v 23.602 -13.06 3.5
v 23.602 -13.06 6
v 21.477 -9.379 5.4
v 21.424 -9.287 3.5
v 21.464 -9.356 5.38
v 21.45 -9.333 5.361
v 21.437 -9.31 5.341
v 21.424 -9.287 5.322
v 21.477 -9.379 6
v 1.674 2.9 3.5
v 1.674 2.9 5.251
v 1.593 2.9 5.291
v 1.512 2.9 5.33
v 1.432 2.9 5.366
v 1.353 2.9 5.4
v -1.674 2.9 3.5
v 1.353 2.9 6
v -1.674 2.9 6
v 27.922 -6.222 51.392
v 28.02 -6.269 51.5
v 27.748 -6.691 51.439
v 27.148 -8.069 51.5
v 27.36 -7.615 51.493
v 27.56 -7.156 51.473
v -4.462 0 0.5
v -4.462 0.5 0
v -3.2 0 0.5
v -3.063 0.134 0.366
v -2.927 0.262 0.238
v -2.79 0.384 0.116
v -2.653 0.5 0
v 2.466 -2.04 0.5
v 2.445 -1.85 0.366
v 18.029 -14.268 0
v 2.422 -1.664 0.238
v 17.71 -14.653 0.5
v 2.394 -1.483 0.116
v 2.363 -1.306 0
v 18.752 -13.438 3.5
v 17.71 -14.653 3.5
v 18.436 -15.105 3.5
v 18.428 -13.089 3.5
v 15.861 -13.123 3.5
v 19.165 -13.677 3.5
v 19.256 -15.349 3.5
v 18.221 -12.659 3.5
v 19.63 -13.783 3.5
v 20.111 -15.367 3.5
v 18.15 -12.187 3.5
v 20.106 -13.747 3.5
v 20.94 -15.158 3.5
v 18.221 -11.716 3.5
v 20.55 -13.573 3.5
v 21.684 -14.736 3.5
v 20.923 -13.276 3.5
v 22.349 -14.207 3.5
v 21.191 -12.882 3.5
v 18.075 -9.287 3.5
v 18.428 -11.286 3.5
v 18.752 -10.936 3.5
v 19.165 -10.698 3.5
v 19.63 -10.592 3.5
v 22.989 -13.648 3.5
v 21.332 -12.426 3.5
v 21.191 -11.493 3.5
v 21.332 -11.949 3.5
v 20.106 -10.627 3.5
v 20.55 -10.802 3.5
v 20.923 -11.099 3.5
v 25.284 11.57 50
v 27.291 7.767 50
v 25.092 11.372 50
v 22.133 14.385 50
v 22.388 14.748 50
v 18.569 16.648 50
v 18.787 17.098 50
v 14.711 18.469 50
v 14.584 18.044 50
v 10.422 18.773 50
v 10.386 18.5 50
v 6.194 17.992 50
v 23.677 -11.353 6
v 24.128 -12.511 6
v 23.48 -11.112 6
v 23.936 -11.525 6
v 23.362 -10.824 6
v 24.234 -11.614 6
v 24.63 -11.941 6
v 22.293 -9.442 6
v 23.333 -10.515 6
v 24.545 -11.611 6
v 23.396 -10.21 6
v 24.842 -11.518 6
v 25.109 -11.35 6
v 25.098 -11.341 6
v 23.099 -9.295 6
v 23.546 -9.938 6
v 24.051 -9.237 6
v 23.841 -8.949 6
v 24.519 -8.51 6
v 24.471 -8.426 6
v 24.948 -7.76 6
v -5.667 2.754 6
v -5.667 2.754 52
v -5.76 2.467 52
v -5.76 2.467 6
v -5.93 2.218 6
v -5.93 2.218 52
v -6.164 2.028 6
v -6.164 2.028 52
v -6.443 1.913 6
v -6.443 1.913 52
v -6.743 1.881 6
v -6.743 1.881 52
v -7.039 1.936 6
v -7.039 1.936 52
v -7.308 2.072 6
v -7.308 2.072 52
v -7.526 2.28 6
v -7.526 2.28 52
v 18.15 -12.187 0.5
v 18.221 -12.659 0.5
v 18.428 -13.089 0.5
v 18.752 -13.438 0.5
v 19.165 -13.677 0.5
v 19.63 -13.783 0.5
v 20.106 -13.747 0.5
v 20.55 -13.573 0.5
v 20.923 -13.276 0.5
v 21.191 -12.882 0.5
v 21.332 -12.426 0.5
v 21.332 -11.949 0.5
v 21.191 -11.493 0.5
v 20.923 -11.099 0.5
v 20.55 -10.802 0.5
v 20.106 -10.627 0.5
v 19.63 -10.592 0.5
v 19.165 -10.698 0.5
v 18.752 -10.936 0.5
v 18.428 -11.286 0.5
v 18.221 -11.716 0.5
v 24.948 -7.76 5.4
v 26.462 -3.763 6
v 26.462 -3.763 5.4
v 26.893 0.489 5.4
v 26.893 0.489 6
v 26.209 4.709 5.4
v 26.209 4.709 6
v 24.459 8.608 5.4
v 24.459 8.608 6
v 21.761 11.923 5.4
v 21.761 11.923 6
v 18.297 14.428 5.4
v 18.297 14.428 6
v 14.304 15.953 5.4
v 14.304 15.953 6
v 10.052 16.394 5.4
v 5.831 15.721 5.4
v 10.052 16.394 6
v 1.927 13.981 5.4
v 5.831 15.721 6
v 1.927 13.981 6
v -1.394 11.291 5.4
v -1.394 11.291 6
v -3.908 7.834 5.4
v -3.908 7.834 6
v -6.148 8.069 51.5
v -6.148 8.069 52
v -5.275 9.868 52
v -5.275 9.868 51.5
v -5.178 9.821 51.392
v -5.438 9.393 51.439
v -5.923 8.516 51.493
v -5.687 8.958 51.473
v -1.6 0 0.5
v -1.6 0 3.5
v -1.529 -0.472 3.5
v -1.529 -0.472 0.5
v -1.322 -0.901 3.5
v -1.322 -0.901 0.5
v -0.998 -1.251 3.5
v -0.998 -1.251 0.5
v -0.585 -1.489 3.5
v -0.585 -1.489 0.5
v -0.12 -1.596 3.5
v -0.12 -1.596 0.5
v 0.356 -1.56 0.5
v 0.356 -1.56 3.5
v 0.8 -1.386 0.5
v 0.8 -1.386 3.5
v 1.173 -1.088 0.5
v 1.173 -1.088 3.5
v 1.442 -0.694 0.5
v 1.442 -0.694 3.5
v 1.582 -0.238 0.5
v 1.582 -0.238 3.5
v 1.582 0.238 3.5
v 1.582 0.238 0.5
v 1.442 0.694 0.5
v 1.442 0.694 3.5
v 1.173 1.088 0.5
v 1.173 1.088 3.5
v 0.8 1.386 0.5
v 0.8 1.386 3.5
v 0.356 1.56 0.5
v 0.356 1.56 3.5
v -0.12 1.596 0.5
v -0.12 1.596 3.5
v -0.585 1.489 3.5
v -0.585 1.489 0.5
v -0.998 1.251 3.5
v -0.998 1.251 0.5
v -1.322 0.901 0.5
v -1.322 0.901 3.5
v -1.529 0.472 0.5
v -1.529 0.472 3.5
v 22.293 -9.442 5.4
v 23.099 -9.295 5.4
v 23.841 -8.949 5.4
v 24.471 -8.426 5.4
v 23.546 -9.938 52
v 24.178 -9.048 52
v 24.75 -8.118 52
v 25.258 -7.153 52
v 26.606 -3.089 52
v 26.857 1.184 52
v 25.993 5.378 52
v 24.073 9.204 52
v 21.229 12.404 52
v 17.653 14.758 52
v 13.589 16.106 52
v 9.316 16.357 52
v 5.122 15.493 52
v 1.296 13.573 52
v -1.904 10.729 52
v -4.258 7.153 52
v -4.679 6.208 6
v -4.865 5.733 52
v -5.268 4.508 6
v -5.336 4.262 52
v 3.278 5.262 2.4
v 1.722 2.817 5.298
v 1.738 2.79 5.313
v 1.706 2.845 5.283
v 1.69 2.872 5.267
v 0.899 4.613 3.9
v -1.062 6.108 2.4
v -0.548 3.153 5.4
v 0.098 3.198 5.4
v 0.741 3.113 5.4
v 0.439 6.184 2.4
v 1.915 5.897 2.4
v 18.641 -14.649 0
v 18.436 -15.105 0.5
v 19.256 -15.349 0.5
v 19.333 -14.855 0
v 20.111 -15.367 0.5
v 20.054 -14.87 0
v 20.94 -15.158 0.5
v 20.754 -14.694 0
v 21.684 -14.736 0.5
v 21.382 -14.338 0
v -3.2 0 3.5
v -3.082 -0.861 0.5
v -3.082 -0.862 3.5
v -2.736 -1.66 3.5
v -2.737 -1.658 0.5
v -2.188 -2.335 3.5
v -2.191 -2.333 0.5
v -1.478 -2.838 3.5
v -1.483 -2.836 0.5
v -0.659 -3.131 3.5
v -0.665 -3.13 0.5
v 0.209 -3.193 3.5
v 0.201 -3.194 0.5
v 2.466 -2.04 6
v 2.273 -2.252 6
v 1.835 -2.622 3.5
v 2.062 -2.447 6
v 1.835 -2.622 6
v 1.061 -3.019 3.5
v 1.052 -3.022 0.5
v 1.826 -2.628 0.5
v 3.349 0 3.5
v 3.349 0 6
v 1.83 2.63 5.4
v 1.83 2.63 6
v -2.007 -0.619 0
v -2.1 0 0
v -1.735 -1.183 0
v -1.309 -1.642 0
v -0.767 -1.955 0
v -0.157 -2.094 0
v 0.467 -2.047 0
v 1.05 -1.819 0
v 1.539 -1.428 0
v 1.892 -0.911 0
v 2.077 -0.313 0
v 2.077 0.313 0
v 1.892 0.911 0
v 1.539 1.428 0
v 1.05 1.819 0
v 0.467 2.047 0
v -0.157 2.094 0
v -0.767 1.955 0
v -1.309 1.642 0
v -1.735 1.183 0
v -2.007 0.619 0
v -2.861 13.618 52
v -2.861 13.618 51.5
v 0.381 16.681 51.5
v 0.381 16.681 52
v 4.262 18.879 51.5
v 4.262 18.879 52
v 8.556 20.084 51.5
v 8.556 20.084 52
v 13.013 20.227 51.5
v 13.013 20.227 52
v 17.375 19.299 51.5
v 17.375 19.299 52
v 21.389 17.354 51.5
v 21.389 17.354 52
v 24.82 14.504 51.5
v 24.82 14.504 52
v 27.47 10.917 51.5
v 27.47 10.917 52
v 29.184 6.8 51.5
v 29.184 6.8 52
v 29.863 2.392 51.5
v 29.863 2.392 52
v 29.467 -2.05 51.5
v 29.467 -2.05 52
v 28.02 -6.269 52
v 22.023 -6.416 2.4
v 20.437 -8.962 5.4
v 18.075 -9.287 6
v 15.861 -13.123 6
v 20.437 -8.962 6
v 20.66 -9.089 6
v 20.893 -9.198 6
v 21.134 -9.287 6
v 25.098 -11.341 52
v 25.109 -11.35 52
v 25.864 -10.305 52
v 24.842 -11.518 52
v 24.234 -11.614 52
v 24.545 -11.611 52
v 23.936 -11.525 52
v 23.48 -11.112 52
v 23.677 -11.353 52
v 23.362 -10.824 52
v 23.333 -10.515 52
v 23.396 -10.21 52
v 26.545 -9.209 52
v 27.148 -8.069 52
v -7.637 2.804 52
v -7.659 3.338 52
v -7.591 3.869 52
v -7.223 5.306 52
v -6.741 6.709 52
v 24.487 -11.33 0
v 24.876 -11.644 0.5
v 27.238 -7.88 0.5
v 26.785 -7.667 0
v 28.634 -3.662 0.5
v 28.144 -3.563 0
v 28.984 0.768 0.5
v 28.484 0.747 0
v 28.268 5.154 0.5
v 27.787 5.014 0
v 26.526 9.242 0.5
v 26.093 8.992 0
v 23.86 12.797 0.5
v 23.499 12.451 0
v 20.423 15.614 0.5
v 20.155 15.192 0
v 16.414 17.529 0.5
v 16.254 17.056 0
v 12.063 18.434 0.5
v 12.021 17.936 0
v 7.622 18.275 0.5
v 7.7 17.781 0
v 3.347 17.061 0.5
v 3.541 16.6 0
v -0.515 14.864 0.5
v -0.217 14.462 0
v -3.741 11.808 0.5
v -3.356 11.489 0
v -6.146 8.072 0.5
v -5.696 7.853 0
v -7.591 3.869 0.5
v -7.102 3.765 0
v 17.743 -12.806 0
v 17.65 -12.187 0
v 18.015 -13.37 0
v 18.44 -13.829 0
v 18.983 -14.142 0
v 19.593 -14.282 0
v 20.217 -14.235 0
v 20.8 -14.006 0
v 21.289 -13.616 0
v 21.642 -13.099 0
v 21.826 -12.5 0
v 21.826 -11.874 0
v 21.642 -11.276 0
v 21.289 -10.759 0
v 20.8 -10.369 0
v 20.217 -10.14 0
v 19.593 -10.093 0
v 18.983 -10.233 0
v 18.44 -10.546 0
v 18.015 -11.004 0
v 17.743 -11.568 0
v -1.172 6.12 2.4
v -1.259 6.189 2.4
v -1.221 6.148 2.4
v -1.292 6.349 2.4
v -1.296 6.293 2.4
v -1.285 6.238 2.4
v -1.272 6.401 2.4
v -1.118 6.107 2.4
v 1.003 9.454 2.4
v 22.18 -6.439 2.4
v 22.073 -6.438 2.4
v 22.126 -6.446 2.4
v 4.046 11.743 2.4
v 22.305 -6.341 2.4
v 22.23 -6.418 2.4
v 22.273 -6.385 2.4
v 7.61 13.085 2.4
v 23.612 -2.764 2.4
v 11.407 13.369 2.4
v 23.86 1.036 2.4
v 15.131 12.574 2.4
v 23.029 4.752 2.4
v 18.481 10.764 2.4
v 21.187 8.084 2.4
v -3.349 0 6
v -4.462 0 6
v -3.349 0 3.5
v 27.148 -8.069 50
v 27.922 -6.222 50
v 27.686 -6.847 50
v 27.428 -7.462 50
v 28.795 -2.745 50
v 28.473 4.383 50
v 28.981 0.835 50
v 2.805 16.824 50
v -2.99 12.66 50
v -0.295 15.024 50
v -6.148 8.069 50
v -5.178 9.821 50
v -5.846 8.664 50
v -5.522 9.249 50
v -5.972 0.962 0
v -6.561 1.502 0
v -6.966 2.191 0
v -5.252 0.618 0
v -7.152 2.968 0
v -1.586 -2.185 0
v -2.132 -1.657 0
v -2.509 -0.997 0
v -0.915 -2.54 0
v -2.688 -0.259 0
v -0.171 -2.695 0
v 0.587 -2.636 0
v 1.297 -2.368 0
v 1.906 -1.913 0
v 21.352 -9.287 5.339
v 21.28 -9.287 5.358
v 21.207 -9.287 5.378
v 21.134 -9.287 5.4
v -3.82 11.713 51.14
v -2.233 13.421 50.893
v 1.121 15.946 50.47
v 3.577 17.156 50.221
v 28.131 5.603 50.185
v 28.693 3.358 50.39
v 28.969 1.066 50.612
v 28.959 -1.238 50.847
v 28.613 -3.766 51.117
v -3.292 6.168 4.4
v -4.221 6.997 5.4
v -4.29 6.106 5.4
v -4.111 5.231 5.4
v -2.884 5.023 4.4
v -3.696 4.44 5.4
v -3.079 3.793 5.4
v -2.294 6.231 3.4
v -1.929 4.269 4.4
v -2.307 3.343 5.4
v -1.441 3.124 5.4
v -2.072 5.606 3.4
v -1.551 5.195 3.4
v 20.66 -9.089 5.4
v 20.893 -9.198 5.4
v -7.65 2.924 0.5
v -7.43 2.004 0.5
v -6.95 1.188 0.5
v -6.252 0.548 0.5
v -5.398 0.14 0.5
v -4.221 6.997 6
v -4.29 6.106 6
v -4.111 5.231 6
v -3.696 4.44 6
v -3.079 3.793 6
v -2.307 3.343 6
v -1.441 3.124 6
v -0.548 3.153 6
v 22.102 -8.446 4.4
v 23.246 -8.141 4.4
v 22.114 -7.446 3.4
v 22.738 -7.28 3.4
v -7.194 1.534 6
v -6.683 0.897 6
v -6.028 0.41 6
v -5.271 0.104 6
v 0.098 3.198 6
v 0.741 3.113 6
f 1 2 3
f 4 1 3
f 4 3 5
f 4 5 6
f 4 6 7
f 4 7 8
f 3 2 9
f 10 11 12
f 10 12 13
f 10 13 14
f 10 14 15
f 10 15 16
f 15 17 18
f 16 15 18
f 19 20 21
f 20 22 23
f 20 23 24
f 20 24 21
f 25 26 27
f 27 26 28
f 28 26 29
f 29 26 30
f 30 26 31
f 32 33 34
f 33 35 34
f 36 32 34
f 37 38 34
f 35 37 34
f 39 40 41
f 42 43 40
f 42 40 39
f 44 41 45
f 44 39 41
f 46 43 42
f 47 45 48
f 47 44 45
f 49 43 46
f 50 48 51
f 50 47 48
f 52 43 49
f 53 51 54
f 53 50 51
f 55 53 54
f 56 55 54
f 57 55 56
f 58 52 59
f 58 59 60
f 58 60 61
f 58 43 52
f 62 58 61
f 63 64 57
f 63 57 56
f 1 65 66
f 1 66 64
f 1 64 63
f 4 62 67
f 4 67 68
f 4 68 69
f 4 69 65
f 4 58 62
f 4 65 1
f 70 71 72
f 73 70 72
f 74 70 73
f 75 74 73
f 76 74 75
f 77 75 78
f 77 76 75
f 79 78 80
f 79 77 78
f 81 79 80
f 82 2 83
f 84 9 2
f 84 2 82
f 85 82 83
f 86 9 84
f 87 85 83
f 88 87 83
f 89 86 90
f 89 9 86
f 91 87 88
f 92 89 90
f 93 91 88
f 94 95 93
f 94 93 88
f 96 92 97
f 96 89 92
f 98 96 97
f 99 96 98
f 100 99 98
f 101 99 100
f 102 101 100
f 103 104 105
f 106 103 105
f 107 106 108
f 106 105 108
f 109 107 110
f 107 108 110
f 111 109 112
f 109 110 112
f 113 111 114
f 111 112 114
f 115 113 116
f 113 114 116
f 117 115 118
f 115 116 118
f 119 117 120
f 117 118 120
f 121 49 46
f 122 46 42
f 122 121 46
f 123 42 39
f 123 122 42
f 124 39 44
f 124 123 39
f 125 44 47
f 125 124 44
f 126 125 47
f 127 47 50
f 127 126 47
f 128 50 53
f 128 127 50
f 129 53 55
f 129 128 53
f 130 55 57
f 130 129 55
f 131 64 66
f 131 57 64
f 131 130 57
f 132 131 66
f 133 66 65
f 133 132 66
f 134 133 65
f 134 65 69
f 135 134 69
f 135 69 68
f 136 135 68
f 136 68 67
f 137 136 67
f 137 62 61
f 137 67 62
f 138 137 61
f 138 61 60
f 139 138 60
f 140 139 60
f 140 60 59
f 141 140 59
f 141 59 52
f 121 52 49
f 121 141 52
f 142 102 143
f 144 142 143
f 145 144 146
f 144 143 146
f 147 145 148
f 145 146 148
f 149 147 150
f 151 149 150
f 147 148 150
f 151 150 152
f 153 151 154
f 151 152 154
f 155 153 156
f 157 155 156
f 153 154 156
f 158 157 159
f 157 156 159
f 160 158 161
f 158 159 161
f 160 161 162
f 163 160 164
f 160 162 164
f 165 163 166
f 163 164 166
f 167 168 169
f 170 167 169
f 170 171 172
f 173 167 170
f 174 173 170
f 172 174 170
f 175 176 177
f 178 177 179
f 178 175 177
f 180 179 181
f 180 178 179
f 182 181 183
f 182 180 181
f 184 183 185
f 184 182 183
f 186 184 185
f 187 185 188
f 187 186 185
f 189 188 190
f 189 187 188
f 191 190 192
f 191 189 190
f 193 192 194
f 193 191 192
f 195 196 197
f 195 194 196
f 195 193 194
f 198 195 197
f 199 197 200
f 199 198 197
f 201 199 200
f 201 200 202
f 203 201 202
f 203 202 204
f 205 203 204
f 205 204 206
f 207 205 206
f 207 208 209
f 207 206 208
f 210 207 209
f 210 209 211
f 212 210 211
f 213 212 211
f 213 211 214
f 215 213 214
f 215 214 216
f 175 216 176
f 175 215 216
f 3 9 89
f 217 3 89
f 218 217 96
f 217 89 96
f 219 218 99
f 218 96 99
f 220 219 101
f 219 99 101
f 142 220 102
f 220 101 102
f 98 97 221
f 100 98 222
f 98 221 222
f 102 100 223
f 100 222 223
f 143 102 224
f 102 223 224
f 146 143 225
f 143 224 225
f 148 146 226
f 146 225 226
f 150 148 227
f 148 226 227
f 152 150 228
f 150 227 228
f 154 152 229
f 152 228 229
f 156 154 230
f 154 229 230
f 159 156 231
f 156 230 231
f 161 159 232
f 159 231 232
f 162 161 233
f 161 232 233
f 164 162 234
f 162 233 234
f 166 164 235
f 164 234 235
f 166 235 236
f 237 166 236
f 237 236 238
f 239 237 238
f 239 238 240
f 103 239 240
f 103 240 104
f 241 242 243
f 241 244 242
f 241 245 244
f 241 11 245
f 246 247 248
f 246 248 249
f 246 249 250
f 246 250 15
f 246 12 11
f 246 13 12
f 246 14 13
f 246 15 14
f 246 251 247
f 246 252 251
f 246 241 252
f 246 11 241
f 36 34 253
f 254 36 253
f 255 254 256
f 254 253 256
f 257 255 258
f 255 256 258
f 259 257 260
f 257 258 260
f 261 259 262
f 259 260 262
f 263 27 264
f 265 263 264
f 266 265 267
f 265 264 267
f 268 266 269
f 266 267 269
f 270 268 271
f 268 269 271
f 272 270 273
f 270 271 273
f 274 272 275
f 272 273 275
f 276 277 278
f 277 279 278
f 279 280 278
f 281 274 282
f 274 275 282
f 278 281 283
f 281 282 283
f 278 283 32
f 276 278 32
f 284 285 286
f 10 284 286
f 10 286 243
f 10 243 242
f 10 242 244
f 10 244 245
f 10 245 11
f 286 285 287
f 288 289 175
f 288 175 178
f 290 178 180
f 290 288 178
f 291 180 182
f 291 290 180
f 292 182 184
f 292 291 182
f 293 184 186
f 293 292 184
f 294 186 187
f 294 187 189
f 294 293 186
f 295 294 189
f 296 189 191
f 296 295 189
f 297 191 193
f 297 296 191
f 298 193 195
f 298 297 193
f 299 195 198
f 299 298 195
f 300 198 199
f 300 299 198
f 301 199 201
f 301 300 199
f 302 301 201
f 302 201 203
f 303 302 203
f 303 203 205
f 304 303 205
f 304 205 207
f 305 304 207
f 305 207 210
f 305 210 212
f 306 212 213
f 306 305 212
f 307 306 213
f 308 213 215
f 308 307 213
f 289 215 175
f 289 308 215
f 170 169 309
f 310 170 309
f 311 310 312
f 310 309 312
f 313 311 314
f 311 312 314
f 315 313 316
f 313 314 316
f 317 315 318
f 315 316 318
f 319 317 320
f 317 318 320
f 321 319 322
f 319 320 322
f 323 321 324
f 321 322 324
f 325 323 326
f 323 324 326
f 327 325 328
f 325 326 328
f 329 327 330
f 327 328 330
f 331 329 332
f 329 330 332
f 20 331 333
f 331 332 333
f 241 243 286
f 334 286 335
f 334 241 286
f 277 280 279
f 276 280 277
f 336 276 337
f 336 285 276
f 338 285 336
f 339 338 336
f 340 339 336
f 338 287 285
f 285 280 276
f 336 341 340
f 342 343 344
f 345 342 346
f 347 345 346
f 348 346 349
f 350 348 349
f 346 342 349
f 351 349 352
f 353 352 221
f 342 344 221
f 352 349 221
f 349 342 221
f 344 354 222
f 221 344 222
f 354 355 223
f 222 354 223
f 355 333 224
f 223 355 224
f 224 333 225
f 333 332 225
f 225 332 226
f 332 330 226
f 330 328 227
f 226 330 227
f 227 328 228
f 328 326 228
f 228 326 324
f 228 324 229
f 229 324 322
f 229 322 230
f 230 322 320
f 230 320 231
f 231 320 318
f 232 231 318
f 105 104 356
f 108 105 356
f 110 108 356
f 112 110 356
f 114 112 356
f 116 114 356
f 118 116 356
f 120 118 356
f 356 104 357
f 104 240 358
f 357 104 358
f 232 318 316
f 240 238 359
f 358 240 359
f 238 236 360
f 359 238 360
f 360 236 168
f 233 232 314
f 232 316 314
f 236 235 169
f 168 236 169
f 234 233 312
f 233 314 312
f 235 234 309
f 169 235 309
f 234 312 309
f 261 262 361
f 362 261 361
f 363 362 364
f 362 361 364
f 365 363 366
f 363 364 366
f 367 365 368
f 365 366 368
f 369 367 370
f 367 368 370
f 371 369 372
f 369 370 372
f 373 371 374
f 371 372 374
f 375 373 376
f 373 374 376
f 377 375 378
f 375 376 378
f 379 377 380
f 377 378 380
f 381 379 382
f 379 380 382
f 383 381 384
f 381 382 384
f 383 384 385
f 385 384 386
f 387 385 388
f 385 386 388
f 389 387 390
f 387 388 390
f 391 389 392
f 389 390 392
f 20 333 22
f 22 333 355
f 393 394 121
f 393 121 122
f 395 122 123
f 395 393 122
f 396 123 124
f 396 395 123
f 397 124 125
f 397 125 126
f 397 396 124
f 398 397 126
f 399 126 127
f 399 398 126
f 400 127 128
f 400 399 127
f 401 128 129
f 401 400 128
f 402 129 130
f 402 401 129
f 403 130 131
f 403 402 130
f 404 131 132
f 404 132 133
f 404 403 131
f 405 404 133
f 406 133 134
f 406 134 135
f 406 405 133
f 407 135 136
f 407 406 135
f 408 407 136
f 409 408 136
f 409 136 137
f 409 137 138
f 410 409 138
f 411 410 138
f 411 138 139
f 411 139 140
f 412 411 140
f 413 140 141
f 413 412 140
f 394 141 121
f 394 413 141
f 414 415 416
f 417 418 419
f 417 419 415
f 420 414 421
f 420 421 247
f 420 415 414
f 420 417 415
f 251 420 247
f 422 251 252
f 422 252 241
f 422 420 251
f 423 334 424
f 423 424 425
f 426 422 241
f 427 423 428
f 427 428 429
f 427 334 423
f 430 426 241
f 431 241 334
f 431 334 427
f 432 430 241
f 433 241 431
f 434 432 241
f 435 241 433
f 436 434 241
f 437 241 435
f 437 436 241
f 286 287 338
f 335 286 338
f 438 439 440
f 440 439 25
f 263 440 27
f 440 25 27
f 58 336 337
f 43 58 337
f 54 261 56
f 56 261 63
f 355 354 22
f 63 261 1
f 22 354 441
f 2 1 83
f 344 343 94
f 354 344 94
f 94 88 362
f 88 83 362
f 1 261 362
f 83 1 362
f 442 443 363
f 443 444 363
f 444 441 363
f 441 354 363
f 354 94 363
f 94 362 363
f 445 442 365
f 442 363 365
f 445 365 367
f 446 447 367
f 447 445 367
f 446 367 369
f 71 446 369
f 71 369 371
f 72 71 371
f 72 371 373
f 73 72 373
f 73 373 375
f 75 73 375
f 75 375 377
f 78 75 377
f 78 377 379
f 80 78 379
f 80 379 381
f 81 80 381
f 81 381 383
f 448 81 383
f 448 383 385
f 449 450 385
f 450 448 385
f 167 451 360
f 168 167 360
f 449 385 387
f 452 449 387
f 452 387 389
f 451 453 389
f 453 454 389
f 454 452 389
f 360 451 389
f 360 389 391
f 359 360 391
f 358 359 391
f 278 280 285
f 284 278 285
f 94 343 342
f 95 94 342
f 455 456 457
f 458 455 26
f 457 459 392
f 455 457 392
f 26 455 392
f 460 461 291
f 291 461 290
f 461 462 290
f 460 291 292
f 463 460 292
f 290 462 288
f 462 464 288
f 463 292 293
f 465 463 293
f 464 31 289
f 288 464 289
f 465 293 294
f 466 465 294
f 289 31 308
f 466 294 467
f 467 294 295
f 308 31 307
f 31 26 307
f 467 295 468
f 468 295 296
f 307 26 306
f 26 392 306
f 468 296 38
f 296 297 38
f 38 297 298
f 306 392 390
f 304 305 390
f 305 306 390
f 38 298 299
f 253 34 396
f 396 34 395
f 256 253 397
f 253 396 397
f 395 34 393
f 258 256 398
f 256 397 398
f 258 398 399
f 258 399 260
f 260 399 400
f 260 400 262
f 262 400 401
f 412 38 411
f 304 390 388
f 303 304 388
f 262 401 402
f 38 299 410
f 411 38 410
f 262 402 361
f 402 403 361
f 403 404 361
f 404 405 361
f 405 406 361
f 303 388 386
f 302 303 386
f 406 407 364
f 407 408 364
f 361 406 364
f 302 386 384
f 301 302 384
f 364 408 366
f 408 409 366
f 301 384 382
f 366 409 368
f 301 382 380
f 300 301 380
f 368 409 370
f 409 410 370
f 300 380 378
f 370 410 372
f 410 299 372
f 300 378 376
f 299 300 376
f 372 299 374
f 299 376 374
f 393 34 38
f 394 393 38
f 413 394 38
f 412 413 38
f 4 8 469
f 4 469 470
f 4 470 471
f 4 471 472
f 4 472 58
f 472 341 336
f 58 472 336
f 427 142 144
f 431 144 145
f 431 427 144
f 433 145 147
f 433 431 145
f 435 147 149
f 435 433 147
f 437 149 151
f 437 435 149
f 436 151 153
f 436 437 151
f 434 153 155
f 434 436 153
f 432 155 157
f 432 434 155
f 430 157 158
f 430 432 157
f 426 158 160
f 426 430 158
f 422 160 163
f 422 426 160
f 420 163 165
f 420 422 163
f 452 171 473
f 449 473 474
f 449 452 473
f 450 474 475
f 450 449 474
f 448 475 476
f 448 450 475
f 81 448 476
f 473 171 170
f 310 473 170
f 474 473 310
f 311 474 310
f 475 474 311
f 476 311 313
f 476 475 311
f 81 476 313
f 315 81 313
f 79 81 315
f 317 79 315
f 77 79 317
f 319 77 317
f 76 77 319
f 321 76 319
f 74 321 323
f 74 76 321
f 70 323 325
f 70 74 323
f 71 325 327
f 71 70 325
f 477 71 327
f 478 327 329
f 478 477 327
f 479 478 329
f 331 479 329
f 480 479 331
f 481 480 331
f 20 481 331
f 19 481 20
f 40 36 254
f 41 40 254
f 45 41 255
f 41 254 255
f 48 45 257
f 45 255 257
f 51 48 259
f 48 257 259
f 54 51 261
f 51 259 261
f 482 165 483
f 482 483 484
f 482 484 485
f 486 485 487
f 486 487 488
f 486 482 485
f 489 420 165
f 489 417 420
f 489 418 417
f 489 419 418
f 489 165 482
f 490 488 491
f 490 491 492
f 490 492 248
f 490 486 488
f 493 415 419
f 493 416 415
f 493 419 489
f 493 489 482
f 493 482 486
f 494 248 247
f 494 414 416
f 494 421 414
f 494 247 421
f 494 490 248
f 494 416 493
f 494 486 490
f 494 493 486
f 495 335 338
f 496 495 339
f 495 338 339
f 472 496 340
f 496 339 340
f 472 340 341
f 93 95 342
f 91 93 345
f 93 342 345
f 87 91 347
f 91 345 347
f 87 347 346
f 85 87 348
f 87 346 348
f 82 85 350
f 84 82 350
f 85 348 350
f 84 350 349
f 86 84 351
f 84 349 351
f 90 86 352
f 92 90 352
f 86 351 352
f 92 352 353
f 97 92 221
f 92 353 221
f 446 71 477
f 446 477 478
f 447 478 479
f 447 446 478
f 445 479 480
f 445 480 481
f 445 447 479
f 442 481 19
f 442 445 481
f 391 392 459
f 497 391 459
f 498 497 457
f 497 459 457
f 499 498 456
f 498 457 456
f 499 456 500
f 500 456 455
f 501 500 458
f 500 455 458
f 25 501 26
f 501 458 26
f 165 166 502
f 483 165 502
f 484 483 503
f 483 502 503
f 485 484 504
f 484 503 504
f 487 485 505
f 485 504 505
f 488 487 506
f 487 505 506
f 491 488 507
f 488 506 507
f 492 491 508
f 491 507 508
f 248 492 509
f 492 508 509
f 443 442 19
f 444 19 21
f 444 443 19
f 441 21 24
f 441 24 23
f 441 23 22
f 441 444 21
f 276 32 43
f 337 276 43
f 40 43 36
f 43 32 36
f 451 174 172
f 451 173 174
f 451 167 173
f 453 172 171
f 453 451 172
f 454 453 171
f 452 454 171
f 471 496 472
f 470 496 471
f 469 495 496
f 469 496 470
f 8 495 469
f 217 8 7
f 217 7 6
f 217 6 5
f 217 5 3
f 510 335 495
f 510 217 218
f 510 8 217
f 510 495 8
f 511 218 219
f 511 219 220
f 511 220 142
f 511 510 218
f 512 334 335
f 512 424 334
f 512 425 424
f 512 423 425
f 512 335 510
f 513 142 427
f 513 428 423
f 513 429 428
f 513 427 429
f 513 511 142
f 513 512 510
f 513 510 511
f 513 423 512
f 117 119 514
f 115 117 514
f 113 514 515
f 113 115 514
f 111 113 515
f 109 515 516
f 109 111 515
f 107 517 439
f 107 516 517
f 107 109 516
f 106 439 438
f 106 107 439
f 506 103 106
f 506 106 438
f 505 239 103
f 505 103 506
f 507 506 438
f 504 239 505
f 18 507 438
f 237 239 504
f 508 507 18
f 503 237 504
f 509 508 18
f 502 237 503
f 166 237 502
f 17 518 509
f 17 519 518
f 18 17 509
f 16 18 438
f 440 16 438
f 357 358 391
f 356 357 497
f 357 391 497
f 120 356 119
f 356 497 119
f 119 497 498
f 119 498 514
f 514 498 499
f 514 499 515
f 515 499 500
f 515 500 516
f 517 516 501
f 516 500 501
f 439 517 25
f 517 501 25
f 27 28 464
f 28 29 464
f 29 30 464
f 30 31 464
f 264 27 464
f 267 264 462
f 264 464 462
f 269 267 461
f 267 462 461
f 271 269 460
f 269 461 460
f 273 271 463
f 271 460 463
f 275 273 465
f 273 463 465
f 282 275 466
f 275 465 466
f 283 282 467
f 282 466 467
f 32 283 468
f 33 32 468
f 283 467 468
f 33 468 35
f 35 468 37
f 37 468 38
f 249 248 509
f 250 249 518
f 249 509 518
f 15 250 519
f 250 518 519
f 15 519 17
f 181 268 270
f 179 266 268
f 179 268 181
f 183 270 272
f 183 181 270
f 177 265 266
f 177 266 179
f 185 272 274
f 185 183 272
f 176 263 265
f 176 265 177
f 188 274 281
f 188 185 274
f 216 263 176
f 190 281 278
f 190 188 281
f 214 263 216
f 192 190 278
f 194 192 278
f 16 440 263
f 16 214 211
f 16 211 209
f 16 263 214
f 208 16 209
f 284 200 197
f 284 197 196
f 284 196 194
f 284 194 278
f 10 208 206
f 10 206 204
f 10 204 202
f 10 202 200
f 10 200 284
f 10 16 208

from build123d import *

# Parameters (mm, degrees)
SKETCH1_R           = 1.6
BOSS_EXTRUDE1_DEPTH = 52
CUT_EXTRUDE1_DEPTH  = 46
CUT_EXTRUDE2_DEPTH  = 3.6
CHAMFER1_SIZE       = 3
CHAMFER2_SIZE       = 0.5
BOSS_EXTRUDE2_DEPTH = 2
CHAMFER3_SIZE       = 1.5
CUT_EXTRUDE4_DEPTH  = 2.5


with BuildPart() as part:
    # Sketch1 → Boss-Extrude1 (new body)
    with BuildSketch(Plane.XY):
        with BuildLine():
            Line((-4.46161756, 0), (-3.2, 0))
            ThreePointArc((-3.2, 0), (-1.084064892, -3.010781179), (2.465502069, -2.039926359))
            Line((2.465502069, -2.039926359), (17.709814498, -14.652884646))
            ThreePointArc((17.709814498, -14.652884646), (19.682532968, -15.386676734), (21.68432718, -14.736377626))
            ThreePointArc((21.68432718, -14.736377626), (20.423085706, 15.613531633), (-7.590844762, 3.869281046))
            ThreePointArc((-7.590844762, 3.869281046), (-6.949759371, 1.187749934), (-4.46161756, 0))
        make_face()
        with Locations(Location((19.749740857, -12.187382577, 0), (0, 0, 180))):
            Circle(SKETCH1_R, mode=Mode.SUBTRACT)
        with Locations(Location((0, 0, 0), (0, 0, 180))):
            Circle(SKETCH1_R, mode=Mode.SUBTRACT)
    extrude(amount=BOSS_EXTRUDE1_DEPTH)

    # Sketch2 → Cut-Extrude1 (cut)
    with BuildSketch(Plane.XY.offset(52)):
        with BuildLine():
            Line((-7.75220957, 2.930270623), (-10.26732185, 3.33405514))
            ThreePointArc((-10.26732185, 3.33405514), (2.118916828, -19.291319949), (27.109557142, -12.904270303))
            Line((27.109557142, -12.904270303), (25.097988128, -11.341445354))
            ThreePointArc((25.097988128, -11.341445354), (23.677045606, -11.352651842), (23.546148123, -9.937706936))
            ThreePointArc((23.546148123, -9.937706936), (17.03488015, 15.04178651), (-5.667119596, 2.753950614))
            ThreePointArc((-5.667119596, 2.753950614), (-6.790684219, 1.884004769), (-7.75220957, 2.930270623))
        make_face()
    extrude(amount=-CUT_EXTRUDE1_DEPTH, mode=Mode.SUBTRACT)

    # Sketch3 → Cut-Extrude2 (cut)
    with BuildSketch(Plane.XY.offset(6)):
        with BuildLine():
            Line((1.692106757, 2.716021856), (20.436641856, -8.961997016))
            ThreePointArc((20.436641856, -8.961997016), (22.952539617, -9.338121402), (24.947839186, -7.760150957))
            ThreePointArc((24.947839186, -7.760150957), (18.297055064, 14.427956624), (-3.907979798, 7.833908229))
            ThreePointArc((-3.907979798, 7.833908229), (-3.696429412, 4.43953433), (-0.548333333, 3.152670385))
            ThreePointArc((-0.548333333, 3.152670385), (0.612143689, 3.140904345), (1.692106757, 2.716021856))
        make_face()
    extrude(amount=-CUT_EXTRUDE2_DEPTH, mode=Mode.SUBTRACT)

    # Chamfer1
    chamfer1_edges = [part.edges().sort_by_distance(p)[0] for p in [
        (0.612143689, 3.140904345, 2.4),
        (11.064374306, -3.12298758, 2.4),
        (22.952539617, -9.338121402, 2.4),
        (18.297055064, 14.427956624, 2.4),
        (-3.696429412, 4.43953433, 2.4),
    ]]
    chamfer(chamfer1_edges, length=CHAMFER1_SIZE)

    # Chamfer2
    chamfer2_edges = [part.edges().sort_by_distance(p)[0] for p in [
        (21.349740857, -12.187382577, 0),
        (1.6, 0, 0),
        (20.423085706, 15.613531633, 0),
        (19.682532968, -15.386676734, 0),
        (10.087658283, -8.346405502, 0),
        (-1.084064892, -3.010781179, 0),
        (-3.83080878, 0, 0),
        (-6.949759371, 1.187749934, 0),
    ]]
    chamfer(chamfer2_edges, length=CHAMFER2_SIZE)

    # Sketch4 → Boss-Extrude2 (add)
    with BuildSketch(Plane.XY.offset(52)):
        with BuildLine():
            Line((-6.147708238, 8.068693229), (-5.275417078, 9.868445471))
            ThreePointArc((-5.275417078, 9.868445471), (19.440984389, 18.44746048), (28.019999398, -6.268940987))
            Line((28.019999398, -6.268940987), (27.147708238, -8.068693229))
            Line((27.147708238, -8.068693229), (25.257968384, -7.152787511))
            ThreePointArc((25.257968384, -7.152787511), (17.652787511, 14.757968384), (-4.257968384, 7.152787511))
            Line((-4.257968384, 7.152787511), (-6.147708238, 8.068693229))
        make_face()
    extrude(amount=-BOSS_EXTRUDE2_DEPTH)

    # Chamfer3
    # the kernel refuses this chamfer: 1.5 mm, written as the material it takes off along each edge
    with BuildSketch(Plane(origin=(-7.83015049, 4.597399062, 50), x_dir=(0.8995358930200849, -0.43598068069350693, -0.02749587661058679), z_dir=(0.4361455799615031, 0.8998761209633491, 0))) as chamfer3_piece_1_section:
        Polygon((CHAMFER3_SIZE * 0.999621916911, -CHAMFER3_SIZE * 0.0274958766106), (-CHAMFER3_SIZE * 0.0274958766106, -CHAMFER3_SIZE * 0.999621916911), (0, 0), align=None)
    chamfer3_piece_1 = extrude(amount=5.857524482, mode=Mode.PRIVATE)
    chamfer3_piece_1 = chamfer3_piece_1 - Plane(origin=(10.5, 0, 50.729873863), x_dir=(0.6045582259252599, -0.7965609527626261, 0), z_dir=(0, 0, -1)) * Cylinder(18.5, 18, mode=Mode.PRIVATE)
    add(chamfer3_piece_1, mode=Mode.SUBTRACT)
    with BuildSketch(Plane(origin=(11.37229116, 1.799752242, 50), x_dir=(-0.899876120963349, 0.43614557996150355, 0), z_dir=(-0.43614557996150355, -0.899876120963349, 0))) as chamfer3_piece_2_section:
        Polygon((18.5, -CHAMFER3_SIZE), (18.5 - CHAMFER3_SIZE, 0), (18.5, 0), align=None)
    chamfer3_piece_2 = revolve(axis=Axis((11.37229116, 1.799752242, 50), (0, 0, -1)), revolution_arc=180, mode=Mode.PRIVATE)
    chamfer3_piece_2 = chamfer3_piece_2 - Plane(origin=(10.5, 0, 50.723063531), x_dir=(0.6045582259252599, -0.7965609527626261, 0), z_dir=(0, 0, -1)) * Cylinder(18.5, 75, mode=Mode.PRIVATE)
    add(chamfer3_piece_2, mode=Mode.SUBTRACT)
    with BuildSketch(Plane(origin=(28.019999398, -6.268940987, 50), x_dir=(0.024742882786820786, -0.011992205050873842, 0.9996219169112968), z_dir=(-0.43614557996150277, -0.8998761209633493, 0))) as chamfer3_piece_3_section:
        Polygon((CHAMFER3_SIZE * 0.999621916911, CHAMFER3_SIZE * 0.0274958766106), (-CHAMFER3_SIZE * 0.0274958766106, CHAMFER3_SIZE * 0.999621916911), (0, 0), align=None)
    chamfer3_piece_3 = extrude(amount=5.857524482, mode=Mode.PRIVATE)
    chamfer3_piece_3 = chamfer3_piece_3 - Plane(origin=(10.5, 0, 50.745956447), x_dir=(0.6045582259252599, -0.7965609527626261, 0), z_dir=(0, 0, -1)) * Cylinder(18.5, 18, mode=Mode.PRIVATE)
    add(chamfer3_piece_3, mode=Mode.SUBTRACT)

    # Sketch5 → Cut-Extrude4 (cut)
    with BuildSketch(Plane.XY.offset(6)):
        Polygon((3.348631561, 0), (1.674315781, 2.9), (-1.674315781, 2.9), (-5.480163243, -3.691921171), (0.106662744, -5.615254708), align=None)
        Polygon((18.075425076, -9.287382577), (13.043037161, -18.003734129), (26.456444552, -18.003734129), (21.424056637, -9.287382577), align=None)
    extrude(amount=-CUT_EXTRUDE4_DEPTH, mode=Mode.SUBTRACT)


solid = part.part
